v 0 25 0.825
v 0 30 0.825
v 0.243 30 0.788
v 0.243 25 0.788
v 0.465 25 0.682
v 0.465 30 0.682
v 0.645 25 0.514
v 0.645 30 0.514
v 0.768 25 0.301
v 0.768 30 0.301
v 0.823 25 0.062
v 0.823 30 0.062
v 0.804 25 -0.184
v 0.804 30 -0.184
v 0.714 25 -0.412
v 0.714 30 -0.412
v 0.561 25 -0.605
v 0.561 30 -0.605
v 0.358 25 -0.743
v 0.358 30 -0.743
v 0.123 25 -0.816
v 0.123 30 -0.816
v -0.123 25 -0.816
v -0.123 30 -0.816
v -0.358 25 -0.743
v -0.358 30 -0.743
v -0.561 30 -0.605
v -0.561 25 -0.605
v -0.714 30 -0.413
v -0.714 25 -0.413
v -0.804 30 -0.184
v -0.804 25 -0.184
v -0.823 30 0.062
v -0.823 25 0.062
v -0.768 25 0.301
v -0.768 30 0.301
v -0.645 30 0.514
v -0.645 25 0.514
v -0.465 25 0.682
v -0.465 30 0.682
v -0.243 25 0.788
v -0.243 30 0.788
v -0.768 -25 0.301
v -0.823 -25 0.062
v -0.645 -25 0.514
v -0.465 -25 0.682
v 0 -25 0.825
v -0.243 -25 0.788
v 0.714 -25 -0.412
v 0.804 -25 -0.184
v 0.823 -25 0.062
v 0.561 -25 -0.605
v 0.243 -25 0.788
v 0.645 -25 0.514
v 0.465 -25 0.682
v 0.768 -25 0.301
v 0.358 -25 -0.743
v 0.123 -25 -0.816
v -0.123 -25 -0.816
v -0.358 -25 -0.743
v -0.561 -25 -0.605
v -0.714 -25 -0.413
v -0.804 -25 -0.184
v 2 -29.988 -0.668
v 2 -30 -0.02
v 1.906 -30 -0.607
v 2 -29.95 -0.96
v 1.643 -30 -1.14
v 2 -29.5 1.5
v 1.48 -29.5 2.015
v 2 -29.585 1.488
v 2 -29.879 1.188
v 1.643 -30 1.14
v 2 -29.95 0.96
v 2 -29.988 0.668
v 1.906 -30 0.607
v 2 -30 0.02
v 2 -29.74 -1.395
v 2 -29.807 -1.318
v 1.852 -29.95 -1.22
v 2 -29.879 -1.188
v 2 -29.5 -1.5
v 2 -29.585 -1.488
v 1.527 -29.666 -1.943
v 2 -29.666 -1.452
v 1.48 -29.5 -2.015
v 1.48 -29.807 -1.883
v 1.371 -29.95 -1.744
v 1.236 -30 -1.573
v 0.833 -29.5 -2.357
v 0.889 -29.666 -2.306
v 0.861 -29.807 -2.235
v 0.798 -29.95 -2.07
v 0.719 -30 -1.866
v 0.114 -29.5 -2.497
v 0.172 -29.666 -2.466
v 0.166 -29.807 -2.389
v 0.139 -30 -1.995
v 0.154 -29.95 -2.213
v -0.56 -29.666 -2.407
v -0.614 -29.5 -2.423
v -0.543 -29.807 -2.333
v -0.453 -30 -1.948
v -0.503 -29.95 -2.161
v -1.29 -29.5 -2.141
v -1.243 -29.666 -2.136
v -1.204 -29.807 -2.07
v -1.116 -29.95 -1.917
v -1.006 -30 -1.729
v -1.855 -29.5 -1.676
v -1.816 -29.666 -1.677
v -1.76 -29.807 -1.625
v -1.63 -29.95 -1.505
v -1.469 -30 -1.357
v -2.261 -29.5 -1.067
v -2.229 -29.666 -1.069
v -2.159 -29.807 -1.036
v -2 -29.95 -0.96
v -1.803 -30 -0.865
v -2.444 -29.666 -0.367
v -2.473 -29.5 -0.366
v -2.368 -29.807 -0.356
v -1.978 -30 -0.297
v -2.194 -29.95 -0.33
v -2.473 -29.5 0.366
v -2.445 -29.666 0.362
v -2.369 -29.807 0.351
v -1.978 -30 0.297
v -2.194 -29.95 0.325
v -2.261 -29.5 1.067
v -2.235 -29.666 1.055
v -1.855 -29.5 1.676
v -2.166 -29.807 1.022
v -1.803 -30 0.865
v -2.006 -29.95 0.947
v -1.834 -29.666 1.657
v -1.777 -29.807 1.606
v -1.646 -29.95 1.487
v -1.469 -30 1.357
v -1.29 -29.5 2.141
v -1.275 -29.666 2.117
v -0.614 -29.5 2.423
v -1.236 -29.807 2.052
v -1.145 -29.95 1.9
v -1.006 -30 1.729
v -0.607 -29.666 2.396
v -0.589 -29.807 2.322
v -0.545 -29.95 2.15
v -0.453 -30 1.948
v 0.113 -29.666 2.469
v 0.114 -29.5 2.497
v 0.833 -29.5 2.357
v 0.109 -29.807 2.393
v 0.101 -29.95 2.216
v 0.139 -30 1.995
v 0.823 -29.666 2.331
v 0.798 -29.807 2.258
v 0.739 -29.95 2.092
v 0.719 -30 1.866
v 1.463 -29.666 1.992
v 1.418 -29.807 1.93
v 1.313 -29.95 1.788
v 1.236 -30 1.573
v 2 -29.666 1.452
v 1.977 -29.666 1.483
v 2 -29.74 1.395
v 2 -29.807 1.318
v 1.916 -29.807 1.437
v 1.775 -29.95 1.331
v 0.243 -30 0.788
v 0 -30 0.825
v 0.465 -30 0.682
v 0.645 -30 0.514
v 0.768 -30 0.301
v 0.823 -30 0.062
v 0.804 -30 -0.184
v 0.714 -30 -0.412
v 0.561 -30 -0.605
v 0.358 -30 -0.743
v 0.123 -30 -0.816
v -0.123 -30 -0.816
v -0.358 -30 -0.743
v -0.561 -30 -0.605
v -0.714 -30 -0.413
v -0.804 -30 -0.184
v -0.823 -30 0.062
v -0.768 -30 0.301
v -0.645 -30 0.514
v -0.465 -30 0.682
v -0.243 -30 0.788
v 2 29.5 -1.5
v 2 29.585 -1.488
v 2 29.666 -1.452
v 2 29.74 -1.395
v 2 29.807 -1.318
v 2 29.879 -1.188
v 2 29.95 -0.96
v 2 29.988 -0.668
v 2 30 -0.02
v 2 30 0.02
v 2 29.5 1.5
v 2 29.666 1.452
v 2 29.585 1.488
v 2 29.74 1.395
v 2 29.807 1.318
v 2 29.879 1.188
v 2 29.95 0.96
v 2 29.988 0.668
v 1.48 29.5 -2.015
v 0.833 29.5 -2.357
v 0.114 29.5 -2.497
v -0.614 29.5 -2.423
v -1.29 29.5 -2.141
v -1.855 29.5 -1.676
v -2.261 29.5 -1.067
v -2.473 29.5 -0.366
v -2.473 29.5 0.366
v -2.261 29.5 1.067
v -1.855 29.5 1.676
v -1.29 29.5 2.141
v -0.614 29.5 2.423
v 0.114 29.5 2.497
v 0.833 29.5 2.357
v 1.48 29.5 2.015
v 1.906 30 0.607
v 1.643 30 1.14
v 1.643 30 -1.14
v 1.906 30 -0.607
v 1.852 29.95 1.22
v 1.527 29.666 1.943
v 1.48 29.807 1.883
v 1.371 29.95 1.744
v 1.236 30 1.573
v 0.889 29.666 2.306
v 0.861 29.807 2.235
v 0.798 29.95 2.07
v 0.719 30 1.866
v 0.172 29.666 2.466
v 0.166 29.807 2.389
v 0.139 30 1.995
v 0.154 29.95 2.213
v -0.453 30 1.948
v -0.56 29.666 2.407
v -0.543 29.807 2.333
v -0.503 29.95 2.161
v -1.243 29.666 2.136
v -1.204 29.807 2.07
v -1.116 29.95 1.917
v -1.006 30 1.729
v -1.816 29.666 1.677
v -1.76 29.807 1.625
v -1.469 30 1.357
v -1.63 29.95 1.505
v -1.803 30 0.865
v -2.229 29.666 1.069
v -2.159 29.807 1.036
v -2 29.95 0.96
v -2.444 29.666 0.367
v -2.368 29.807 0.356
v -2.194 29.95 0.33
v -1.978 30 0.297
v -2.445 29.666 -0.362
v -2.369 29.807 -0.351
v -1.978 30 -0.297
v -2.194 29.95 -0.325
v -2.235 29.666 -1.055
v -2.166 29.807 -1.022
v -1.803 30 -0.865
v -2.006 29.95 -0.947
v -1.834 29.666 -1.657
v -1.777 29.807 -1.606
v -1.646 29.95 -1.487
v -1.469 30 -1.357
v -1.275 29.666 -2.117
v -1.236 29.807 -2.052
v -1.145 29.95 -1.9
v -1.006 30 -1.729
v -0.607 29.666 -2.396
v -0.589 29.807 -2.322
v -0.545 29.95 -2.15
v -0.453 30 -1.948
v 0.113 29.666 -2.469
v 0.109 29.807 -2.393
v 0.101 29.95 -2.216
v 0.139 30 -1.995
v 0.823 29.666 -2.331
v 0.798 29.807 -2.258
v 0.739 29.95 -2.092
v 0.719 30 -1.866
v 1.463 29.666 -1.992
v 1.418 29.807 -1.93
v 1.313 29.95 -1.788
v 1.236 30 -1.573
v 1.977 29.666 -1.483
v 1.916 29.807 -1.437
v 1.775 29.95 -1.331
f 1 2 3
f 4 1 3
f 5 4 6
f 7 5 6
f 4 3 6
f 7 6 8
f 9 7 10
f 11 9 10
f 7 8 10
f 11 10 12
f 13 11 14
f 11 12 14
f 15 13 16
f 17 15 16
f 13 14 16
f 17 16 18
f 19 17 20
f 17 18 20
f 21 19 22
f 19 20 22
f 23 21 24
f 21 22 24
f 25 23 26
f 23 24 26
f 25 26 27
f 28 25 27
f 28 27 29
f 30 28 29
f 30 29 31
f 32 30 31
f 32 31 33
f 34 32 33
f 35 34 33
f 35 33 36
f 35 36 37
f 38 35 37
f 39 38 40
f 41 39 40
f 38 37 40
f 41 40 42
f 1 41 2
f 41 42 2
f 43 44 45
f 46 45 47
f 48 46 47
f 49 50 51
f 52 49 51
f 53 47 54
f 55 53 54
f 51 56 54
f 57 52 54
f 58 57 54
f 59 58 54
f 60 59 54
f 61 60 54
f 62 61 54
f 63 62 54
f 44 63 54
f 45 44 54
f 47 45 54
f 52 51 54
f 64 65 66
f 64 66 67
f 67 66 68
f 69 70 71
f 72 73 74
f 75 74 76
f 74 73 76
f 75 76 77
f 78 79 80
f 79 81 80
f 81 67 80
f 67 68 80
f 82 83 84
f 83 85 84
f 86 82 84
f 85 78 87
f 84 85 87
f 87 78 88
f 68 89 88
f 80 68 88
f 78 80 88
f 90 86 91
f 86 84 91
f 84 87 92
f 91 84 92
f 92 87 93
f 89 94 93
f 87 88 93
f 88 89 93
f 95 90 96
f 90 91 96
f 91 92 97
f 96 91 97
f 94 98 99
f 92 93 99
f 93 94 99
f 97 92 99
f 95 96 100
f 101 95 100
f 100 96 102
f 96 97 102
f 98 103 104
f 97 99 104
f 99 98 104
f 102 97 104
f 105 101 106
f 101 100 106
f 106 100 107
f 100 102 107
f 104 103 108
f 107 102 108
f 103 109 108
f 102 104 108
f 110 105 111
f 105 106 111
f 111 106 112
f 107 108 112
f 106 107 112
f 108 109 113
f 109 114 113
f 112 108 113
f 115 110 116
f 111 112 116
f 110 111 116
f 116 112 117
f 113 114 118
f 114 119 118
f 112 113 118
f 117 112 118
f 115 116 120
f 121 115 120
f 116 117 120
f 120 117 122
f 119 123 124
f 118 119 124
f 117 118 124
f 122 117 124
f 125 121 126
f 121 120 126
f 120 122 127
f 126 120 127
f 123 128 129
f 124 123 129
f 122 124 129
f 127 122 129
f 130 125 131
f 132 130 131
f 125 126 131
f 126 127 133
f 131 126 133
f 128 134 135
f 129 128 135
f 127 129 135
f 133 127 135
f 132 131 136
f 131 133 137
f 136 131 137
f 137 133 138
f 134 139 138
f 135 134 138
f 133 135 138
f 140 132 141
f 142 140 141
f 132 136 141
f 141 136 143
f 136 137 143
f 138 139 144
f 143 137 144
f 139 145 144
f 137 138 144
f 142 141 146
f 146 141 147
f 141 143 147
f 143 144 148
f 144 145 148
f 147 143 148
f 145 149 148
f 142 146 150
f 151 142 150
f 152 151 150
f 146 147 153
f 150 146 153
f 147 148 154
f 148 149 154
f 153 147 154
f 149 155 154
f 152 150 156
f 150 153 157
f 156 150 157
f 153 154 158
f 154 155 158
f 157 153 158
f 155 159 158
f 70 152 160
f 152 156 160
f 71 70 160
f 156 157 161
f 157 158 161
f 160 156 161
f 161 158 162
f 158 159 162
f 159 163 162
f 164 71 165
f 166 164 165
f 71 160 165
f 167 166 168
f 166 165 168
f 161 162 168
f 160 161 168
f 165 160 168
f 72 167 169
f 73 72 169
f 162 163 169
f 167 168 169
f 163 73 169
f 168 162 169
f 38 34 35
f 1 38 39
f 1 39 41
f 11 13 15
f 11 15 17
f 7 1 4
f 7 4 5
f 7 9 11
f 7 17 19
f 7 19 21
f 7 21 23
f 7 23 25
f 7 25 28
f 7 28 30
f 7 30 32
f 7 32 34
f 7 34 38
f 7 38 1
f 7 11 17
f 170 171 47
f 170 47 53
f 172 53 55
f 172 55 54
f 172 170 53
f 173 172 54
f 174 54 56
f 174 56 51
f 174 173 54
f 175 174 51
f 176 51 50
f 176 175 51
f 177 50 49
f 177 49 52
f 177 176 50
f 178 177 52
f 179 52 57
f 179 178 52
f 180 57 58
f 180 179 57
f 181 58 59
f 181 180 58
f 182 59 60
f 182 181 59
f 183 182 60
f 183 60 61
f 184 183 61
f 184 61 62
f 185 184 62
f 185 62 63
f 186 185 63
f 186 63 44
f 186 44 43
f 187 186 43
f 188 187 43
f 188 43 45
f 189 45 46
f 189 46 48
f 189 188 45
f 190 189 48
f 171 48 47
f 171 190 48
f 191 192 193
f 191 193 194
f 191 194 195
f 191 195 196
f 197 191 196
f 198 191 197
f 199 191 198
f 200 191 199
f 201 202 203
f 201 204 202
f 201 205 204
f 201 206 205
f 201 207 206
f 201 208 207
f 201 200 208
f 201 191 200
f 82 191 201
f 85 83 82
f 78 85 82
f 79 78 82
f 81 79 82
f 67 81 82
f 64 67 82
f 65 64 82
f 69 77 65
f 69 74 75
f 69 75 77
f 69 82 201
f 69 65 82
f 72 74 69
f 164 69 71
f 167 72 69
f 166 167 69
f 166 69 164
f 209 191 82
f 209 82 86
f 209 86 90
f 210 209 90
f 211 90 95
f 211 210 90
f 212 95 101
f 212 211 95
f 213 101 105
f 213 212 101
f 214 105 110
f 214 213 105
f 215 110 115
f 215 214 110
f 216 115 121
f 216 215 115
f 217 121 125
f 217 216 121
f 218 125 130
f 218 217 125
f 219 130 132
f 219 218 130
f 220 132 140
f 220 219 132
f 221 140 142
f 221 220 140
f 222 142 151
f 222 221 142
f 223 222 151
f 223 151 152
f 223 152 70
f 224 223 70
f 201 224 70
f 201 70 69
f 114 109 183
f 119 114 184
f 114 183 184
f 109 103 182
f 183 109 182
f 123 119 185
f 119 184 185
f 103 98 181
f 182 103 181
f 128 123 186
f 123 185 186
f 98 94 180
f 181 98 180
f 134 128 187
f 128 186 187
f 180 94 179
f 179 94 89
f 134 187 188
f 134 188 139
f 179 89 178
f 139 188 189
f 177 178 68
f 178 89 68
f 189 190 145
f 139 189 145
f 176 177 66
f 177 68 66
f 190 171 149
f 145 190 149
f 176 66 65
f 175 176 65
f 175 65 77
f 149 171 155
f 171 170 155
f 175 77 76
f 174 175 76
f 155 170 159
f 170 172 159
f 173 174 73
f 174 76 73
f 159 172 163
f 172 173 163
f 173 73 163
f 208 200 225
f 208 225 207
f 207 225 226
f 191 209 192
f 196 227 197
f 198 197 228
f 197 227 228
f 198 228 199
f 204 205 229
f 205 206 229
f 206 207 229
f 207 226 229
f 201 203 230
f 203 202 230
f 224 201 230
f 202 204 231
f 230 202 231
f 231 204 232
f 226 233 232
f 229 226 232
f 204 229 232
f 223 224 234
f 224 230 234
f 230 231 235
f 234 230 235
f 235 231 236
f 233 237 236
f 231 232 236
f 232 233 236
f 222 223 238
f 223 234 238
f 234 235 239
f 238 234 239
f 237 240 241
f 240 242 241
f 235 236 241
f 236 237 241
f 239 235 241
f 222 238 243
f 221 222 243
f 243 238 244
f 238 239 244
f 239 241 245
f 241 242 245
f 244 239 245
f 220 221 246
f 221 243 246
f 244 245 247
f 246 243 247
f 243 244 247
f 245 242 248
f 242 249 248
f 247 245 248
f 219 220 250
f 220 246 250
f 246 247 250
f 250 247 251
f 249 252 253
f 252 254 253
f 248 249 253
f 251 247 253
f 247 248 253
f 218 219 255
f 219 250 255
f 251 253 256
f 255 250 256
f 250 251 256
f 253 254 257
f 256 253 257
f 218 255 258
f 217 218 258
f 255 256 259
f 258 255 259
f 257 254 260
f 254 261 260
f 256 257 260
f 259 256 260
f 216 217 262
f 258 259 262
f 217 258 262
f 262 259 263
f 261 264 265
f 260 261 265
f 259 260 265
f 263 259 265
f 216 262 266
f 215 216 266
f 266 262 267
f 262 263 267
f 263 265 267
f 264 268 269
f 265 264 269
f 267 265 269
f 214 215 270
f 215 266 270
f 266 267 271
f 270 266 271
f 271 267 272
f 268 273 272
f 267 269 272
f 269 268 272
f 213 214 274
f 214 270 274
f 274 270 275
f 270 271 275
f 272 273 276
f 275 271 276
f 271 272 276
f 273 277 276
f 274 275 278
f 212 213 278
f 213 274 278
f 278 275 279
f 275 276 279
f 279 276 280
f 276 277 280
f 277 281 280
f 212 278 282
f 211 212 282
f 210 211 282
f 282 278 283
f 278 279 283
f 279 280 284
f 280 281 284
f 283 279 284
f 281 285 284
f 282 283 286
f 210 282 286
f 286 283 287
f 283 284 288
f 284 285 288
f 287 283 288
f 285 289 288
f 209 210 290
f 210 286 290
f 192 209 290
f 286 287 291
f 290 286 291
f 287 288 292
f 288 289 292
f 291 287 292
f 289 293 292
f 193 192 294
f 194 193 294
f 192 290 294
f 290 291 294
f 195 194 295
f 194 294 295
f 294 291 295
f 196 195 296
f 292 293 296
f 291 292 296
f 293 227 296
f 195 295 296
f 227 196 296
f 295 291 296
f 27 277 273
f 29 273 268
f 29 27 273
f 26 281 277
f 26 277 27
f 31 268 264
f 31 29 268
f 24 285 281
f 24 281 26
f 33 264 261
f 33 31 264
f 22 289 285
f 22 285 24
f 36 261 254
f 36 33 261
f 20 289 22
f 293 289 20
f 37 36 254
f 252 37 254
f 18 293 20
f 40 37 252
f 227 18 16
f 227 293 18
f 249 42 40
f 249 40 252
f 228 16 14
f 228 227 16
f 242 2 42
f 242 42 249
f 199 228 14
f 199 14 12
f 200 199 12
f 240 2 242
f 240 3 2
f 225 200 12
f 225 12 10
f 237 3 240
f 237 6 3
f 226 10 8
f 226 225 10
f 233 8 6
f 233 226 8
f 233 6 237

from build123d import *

# Parameters (mm, degrees)
SKETCH1_R            = 2.5
BOSS_EXTRUDE1_DEPTH  = 30
SKETCH2_R            = 0.825
CUT_EXTRUDE1_DEPTH   = 5
CUT_EXTRUDE2_DEPTH   = 31.207614934
FILLET1_R            = 0.5
FILLET1_OF_MIRROR1_R = 0.5


with BuildPart() as part:
    # Sketch1 → Boss-Extrude1 (new body)
    with BuildSketch(Plane(origin=(0, 0, 0), x_dir=(1, 0, 0), z_dir=(0, 1, 0))):
        with Locations(Location((0, 0, 0), (0, 0, 270))):
            Circle(SKETCH1_R)
    boss_extrude1 = extrude(amount=BOSS_EXTRUDE1_DEPTH)

    # Sketch2 → Cut-Extrude1 (cut)
    with BuildSketch(Plane(origin=(0, 30, 0), x_dir=(1, 0, 0), z_dir=(0, 1, 0))):
        with Locations(Location((0, 0, 0), (0, 0, 270))):
            Circle(SKETCH2_R)
    cut_extrude1 = extrude(amount=-CUT_EXTRUDE1_DEPTH, mode=Mode.SUBTRACT)

    # Sketch3 → Cut-Extrude2 (cut, through all)
    with BuildSketch(Plane(origin=(0, 30, 0), x_dir=(1, 0, 0), z_dir=(0, 1, 0))):
        with BuildLine():
            Line((2, 1.5), (2, -1.5))
            ThreePointArc((2, -1.5), (2.5, 0), (2, 1.5))
        make_face()
    cut_extrude2 = extrude(amount=-CUT_EXTRUDE2_DEPTH, mode=Mode.SUBTRACT)

    # Fillet1
    fillet1_edges = [part.edges().sort_by_distance(p)[0] for p in [
        (-2.5, 30, 0),
    ]]
    fillet(fillet1_edges, radius=FILLET1_R - 0.0001)  # a hair under: the kernel refuses the full size

    # Mirror1: Boss-Extrude1, Cut-Extrude1, Cut-Extrude2 across plane
    add(boss_extrude1.mirror(Plane.ZX))
    add(cut_extrude1.mirror(Plane.ZX), mode=Mode.SUBTRACT)
    add(cut_extrude2.mirror(Plane.ZX), mode=Mode.SUBTRACT)

    # Fillet1 of Mirror1
    fillet1_of_mirror1_edges = [part.edges().sort_by_distance(p)[0] for p in [
        (-2.5, -30, 0),
    ]]
    fillet(fillet1_of_mirror1_edges, radius=FILLET1_OF_MIRROR1_R - 0.0001)  # a hair under: the kernel refuses the full size


solid = part.part
